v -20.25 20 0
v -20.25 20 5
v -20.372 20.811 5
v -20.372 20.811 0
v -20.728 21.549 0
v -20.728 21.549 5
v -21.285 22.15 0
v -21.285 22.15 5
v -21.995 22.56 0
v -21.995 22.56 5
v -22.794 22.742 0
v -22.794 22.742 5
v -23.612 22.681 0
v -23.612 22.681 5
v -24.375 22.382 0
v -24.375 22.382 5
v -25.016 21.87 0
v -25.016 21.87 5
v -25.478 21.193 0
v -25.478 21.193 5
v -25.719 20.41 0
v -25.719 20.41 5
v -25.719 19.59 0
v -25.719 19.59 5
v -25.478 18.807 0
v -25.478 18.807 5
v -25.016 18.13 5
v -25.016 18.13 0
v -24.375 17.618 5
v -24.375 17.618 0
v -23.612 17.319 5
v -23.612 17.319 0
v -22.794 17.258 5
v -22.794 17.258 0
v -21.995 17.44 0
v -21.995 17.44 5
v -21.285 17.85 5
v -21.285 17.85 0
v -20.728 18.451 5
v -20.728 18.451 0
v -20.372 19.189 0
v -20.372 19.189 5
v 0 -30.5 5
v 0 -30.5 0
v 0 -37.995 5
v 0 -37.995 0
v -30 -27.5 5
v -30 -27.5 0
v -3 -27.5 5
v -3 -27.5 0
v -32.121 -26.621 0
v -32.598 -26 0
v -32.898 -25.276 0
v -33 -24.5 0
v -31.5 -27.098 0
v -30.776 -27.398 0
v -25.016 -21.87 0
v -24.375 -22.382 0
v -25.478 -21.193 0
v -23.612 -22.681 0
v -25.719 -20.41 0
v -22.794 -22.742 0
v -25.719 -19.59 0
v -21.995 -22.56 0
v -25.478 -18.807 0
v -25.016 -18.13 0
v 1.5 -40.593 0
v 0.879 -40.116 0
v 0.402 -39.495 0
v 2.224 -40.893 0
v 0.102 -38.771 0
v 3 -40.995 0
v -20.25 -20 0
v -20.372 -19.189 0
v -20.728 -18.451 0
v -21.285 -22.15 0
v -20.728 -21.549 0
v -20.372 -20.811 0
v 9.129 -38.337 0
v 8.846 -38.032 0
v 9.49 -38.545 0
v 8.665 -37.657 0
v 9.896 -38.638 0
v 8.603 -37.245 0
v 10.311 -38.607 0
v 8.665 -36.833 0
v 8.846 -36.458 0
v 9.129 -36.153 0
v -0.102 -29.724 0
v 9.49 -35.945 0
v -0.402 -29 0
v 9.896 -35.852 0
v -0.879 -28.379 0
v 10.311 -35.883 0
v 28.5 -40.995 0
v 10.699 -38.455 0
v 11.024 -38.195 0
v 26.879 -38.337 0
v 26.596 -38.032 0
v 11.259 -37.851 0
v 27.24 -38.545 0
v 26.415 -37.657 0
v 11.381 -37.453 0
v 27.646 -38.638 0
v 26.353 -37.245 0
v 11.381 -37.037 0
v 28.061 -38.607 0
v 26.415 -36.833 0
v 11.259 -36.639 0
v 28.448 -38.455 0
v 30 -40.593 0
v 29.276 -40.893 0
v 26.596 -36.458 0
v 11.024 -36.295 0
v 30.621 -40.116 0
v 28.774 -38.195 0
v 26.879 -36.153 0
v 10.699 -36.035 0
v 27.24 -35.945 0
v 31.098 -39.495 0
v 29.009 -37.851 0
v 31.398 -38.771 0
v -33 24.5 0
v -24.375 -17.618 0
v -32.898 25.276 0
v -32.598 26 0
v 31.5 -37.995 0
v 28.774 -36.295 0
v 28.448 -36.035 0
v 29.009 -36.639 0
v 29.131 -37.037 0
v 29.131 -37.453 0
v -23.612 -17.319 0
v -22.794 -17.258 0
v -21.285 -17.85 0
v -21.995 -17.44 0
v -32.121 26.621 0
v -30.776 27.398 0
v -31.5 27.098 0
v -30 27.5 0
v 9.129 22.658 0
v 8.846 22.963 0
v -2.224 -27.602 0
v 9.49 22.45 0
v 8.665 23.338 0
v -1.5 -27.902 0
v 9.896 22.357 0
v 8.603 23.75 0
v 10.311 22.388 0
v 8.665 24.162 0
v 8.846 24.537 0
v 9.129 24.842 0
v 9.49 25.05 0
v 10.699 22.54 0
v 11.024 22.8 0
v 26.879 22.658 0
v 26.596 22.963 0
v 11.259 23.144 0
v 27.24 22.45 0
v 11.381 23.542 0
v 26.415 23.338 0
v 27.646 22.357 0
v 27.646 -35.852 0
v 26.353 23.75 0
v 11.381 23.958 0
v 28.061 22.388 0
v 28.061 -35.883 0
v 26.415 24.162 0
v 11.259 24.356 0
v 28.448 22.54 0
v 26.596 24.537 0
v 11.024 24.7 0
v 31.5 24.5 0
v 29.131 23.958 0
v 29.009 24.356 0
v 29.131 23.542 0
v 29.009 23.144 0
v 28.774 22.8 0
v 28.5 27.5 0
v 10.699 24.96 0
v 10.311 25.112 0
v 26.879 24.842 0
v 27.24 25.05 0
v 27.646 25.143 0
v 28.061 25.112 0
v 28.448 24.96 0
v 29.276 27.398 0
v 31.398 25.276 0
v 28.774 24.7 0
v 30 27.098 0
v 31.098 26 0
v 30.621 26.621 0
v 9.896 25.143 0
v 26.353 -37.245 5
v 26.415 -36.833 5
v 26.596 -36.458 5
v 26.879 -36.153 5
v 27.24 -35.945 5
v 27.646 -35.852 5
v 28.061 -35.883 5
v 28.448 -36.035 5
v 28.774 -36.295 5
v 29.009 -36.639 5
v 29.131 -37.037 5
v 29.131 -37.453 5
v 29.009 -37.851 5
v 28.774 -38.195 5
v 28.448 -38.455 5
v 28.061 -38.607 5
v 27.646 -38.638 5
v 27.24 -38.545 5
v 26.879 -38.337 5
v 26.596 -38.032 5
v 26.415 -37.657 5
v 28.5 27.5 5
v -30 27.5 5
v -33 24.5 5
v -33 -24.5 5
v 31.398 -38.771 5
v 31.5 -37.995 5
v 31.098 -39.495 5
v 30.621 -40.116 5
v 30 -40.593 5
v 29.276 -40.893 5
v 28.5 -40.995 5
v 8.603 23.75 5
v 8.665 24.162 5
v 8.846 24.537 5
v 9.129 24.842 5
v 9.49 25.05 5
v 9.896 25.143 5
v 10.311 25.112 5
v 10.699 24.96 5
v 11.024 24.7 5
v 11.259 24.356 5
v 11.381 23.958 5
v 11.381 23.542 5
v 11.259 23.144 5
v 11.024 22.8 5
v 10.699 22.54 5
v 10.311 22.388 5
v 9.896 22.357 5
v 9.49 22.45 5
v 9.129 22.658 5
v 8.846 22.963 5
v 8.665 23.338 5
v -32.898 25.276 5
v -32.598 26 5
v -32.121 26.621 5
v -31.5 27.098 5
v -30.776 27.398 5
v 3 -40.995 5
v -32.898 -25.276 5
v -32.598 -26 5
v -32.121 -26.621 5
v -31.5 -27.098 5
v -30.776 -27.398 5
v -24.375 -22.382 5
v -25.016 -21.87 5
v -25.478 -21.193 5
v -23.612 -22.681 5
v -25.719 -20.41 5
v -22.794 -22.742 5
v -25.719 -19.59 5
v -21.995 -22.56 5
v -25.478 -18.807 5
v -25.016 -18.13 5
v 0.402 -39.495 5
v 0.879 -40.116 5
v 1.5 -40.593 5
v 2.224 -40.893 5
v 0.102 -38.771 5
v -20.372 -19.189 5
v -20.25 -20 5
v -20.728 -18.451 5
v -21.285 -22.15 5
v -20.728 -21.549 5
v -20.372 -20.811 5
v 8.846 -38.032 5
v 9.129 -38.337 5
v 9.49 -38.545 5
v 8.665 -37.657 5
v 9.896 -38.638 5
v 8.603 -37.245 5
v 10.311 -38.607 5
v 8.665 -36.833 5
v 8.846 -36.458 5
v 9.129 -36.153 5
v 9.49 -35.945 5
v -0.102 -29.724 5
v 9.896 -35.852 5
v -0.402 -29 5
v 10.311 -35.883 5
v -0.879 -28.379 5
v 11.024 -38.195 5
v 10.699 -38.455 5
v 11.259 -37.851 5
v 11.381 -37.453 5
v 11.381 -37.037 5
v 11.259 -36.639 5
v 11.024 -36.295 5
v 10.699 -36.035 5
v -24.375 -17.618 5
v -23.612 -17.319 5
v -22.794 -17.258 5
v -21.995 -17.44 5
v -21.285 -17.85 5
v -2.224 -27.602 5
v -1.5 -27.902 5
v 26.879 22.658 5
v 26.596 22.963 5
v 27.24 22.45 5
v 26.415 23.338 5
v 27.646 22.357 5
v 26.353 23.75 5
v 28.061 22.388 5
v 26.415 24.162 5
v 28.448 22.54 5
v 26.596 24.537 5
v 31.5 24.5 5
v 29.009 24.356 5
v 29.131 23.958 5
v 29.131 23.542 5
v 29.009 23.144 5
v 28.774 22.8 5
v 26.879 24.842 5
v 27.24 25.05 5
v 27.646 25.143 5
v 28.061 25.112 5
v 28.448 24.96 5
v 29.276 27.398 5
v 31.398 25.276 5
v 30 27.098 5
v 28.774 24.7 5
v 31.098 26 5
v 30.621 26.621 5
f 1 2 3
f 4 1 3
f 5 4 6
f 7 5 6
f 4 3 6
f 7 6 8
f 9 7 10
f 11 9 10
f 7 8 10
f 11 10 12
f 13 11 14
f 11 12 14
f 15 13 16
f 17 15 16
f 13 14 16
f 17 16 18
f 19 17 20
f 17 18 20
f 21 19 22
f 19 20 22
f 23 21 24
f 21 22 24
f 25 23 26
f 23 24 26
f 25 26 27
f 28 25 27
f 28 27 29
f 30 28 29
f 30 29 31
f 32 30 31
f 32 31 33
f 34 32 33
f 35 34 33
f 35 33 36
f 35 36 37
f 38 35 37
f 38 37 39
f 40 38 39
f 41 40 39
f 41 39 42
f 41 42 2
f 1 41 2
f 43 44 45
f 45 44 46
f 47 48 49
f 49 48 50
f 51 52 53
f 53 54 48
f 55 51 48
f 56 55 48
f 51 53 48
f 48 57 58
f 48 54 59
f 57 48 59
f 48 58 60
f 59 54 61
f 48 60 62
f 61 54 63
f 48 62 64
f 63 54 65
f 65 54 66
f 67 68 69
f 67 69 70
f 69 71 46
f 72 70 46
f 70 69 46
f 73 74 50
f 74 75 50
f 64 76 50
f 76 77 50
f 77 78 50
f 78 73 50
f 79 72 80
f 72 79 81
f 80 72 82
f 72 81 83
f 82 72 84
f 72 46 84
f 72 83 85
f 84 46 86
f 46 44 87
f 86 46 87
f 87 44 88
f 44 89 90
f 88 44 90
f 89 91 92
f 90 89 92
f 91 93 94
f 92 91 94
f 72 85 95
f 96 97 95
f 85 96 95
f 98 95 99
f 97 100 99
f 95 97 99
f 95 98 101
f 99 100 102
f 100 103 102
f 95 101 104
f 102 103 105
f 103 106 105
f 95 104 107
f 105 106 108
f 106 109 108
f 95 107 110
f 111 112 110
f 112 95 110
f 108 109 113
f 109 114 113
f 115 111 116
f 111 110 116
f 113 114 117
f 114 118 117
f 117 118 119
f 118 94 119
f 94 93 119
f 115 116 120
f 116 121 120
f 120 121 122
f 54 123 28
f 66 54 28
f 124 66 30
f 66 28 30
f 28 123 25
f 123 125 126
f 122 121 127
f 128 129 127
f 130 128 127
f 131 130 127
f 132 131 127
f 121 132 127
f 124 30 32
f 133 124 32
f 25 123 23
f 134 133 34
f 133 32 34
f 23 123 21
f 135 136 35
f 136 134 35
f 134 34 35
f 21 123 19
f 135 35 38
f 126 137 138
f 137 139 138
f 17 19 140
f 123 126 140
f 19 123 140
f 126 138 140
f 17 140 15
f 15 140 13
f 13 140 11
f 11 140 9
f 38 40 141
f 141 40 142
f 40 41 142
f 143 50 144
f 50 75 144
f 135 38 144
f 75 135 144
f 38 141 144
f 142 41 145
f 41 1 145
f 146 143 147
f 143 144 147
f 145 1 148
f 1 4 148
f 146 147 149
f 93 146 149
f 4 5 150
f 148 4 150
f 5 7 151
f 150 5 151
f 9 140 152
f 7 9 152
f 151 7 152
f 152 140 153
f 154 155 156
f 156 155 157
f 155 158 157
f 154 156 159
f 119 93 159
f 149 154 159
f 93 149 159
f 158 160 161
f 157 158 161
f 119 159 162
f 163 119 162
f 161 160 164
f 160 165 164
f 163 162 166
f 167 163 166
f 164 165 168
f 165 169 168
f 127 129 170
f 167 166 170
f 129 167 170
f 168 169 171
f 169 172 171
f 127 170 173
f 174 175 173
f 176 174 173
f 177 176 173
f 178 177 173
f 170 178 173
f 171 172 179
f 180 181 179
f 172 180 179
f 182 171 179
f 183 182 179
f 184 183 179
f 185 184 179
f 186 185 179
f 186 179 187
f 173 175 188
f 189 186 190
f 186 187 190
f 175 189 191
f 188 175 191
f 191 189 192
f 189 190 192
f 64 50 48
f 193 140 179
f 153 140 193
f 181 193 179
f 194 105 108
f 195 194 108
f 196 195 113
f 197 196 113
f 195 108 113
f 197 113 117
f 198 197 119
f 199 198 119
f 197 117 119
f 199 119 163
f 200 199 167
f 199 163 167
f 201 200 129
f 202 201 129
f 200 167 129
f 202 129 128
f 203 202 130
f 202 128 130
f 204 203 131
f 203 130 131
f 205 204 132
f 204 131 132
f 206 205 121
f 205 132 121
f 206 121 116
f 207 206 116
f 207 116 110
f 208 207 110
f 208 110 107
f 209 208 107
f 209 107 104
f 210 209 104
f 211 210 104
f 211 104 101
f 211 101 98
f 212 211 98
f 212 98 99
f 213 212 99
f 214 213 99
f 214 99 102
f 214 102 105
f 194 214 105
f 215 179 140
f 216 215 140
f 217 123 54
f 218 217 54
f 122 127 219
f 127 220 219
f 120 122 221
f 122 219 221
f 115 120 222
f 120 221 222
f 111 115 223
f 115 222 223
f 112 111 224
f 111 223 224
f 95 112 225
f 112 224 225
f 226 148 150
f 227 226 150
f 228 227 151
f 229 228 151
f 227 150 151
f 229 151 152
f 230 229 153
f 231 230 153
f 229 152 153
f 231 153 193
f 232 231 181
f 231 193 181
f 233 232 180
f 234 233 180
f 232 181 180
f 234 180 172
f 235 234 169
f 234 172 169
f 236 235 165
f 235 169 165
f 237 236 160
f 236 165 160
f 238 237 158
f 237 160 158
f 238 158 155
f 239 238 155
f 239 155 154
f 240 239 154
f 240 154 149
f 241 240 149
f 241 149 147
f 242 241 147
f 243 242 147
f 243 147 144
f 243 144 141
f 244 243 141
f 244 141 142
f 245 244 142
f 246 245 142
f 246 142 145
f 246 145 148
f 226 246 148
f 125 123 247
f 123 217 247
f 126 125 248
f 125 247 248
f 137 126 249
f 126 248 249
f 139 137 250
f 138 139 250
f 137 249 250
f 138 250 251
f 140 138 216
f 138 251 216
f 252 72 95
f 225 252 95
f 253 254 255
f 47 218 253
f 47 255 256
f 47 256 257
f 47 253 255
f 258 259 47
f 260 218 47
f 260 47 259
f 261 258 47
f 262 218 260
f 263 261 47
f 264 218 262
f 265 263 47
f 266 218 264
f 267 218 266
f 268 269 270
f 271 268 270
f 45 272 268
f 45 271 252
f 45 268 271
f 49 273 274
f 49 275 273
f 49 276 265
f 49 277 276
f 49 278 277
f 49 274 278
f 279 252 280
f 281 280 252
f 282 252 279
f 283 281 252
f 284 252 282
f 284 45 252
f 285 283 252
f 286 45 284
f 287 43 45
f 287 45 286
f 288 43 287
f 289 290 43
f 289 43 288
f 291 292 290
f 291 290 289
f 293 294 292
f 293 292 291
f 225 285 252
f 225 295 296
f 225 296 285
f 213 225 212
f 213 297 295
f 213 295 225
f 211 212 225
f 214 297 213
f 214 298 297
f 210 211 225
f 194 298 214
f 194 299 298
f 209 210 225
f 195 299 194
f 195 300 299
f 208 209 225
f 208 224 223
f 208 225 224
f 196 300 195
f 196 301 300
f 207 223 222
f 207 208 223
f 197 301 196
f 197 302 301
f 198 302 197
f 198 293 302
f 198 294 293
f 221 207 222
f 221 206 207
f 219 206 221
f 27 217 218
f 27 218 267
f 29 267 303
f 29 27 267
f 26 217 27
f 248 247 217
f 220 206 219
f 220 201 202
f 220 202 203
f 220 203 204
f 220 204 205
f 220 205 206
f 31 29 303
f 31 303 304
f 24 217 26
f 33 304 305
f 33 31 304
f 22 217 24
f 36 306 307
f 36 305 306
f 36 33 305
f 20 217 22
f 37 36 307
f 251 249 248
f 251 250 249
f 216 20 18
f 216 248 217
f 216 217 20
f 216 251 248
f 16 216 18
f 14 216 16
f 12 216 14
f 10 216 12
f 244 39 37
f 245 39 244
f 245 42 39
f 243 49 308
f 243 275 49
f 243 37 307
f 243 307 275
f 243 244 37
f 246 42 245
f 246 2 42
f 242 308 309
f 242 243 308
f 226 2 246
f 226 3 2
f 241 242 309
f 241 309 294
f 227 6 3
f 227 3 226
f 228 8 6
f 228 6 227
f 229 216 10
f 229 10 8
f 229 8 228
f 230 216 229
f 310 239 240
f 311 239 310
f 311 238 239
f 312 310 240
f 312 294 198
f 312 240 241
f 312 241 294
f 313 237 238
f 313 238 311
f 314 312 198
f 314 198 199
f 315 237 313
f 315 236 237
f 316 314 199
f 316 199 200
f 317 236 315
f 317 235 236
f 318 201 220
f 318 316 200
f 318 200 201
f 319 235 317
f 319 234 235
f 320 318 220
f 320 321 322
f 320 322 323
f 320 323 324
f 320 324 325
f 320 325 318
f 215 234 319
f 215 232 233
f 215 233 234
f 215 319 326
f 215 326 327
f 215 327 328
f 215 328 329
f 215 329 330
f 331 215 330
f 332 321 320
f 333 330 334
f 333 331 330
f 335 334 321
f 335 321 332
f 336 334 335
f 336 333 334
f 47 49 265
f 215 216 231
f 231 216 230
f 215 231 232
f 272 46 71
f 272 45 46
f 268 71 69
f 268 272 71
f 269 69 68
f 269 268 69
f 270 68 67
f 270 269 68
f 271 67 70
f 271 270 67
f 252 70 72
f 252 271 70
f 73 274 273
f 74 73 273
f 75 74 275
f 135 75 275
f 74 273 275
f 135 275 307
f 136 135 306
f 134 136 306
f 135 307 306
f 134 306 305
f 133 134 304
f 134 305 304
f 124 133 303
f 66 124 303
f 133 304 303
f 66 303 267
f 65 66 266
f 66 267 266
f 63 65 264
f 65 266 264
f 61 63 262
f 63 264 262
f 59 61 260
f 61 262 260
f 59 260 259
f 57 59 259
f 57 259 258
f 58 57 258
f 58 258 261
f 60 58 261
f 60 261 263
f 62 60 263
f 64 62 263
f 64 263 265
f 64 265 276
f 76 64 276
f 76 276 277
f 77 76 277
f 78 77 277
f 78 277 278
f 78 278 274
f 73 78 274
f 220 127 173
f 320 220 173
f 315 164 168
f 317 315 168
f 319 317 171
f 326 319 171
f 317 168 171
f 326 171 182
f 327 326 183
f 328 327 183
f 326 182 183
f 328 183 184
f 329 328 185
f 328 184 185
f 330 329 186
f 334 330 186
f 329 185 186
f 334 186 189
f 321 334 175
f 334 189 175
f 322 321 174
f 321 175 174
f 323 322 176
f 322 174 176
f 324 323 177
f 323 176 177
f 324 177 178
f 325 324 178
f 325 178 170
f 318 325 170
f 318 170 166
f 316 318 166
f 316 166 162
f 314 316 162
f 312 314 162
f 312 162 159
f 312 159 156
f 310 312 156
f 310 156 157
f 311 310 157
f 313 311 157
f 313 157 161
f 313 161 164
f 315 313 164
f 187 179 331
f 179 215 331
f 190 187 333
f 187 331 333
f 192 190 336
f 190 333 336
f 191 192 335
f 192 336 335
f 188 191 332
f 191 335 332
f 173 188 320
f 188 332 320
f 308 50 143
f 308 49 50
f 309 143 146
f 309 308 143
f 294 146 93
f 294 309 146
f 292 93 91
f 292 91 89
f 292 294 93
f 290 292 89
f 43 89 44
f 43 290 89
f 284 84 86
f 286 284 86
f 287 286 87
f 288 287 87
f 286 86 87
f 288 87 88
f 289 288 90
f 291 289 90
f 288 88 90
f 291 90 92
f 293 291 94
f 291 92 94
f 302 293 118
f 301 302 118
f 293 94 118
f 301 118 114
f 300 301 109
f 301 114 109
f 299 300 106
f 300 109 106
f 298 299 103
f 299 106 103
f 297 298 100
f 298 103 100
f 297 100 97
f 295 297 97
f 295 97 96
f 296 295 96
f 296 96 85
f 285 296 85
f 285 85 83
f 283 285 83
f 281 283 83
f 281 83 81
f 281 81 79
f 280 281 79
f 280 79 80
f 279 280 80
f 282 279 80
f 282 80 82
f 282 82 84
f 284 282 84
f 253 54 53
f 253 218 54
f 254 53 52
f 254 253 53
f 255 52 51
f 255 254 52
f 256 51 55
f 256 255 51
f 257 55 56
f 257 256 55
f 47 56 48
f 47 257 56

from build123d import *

# Parameters (mm, degrees)
MAIN_DEPTH            = 5
GEAR_AXIS_HOLES_D     = 5.5
FILLET1_R             = 3
F_3_CLEARANCE_HOLE1_D = 2.794


with BuildPart() as part:
    # Base → Main (new body)
    with BuildSketch(Plane.XY):
        Polygon((0, 27.5), (-33, 27.5), (-33, -27.5), (0, -27.5), (0, -40.995), (24, -40.995), (31.5, -40.995), (31.5, 27.5), (24, 27.5), align=None)
    extrude(amount=MAIN_DEPTH)

    # Gear Axis Holes (through all)
    with Locations(Plane(origin=(0, 0, 0), x_dir=(-1, 0, 0), z_dir=(0, 0, -1))):
        with Locations((23, -20), (23, 20)):
            Hole(GEAR_AXIS_HOLES_D / 2)

    # Fillet1
    fillet1_edges = [part.edges().sort_by_distance(p)[0] for p in [
        (31.5, 27.5, 2.5),
        (31.5, -40.995, 2.5),
        (0, -40.995, 2.5),
        (0, -27.5, 2.5),
        (-33, -27.5, 2.5),
        (-33, 27.5, 2.5),
    ]]
    fillet(fillet1_edges, radius=FILLET1_R)

    # #3 Clearance Hole1 (through all)
    with Locations(Plane.XY.offset(5)):
        with Locations((10, 23.75), (27.75, 23.75), (27.75, -37.245), (10, -37.245)):
            Hole(F_3_CLEARANCE_HOLE1_D / 2)


solid = part.part
